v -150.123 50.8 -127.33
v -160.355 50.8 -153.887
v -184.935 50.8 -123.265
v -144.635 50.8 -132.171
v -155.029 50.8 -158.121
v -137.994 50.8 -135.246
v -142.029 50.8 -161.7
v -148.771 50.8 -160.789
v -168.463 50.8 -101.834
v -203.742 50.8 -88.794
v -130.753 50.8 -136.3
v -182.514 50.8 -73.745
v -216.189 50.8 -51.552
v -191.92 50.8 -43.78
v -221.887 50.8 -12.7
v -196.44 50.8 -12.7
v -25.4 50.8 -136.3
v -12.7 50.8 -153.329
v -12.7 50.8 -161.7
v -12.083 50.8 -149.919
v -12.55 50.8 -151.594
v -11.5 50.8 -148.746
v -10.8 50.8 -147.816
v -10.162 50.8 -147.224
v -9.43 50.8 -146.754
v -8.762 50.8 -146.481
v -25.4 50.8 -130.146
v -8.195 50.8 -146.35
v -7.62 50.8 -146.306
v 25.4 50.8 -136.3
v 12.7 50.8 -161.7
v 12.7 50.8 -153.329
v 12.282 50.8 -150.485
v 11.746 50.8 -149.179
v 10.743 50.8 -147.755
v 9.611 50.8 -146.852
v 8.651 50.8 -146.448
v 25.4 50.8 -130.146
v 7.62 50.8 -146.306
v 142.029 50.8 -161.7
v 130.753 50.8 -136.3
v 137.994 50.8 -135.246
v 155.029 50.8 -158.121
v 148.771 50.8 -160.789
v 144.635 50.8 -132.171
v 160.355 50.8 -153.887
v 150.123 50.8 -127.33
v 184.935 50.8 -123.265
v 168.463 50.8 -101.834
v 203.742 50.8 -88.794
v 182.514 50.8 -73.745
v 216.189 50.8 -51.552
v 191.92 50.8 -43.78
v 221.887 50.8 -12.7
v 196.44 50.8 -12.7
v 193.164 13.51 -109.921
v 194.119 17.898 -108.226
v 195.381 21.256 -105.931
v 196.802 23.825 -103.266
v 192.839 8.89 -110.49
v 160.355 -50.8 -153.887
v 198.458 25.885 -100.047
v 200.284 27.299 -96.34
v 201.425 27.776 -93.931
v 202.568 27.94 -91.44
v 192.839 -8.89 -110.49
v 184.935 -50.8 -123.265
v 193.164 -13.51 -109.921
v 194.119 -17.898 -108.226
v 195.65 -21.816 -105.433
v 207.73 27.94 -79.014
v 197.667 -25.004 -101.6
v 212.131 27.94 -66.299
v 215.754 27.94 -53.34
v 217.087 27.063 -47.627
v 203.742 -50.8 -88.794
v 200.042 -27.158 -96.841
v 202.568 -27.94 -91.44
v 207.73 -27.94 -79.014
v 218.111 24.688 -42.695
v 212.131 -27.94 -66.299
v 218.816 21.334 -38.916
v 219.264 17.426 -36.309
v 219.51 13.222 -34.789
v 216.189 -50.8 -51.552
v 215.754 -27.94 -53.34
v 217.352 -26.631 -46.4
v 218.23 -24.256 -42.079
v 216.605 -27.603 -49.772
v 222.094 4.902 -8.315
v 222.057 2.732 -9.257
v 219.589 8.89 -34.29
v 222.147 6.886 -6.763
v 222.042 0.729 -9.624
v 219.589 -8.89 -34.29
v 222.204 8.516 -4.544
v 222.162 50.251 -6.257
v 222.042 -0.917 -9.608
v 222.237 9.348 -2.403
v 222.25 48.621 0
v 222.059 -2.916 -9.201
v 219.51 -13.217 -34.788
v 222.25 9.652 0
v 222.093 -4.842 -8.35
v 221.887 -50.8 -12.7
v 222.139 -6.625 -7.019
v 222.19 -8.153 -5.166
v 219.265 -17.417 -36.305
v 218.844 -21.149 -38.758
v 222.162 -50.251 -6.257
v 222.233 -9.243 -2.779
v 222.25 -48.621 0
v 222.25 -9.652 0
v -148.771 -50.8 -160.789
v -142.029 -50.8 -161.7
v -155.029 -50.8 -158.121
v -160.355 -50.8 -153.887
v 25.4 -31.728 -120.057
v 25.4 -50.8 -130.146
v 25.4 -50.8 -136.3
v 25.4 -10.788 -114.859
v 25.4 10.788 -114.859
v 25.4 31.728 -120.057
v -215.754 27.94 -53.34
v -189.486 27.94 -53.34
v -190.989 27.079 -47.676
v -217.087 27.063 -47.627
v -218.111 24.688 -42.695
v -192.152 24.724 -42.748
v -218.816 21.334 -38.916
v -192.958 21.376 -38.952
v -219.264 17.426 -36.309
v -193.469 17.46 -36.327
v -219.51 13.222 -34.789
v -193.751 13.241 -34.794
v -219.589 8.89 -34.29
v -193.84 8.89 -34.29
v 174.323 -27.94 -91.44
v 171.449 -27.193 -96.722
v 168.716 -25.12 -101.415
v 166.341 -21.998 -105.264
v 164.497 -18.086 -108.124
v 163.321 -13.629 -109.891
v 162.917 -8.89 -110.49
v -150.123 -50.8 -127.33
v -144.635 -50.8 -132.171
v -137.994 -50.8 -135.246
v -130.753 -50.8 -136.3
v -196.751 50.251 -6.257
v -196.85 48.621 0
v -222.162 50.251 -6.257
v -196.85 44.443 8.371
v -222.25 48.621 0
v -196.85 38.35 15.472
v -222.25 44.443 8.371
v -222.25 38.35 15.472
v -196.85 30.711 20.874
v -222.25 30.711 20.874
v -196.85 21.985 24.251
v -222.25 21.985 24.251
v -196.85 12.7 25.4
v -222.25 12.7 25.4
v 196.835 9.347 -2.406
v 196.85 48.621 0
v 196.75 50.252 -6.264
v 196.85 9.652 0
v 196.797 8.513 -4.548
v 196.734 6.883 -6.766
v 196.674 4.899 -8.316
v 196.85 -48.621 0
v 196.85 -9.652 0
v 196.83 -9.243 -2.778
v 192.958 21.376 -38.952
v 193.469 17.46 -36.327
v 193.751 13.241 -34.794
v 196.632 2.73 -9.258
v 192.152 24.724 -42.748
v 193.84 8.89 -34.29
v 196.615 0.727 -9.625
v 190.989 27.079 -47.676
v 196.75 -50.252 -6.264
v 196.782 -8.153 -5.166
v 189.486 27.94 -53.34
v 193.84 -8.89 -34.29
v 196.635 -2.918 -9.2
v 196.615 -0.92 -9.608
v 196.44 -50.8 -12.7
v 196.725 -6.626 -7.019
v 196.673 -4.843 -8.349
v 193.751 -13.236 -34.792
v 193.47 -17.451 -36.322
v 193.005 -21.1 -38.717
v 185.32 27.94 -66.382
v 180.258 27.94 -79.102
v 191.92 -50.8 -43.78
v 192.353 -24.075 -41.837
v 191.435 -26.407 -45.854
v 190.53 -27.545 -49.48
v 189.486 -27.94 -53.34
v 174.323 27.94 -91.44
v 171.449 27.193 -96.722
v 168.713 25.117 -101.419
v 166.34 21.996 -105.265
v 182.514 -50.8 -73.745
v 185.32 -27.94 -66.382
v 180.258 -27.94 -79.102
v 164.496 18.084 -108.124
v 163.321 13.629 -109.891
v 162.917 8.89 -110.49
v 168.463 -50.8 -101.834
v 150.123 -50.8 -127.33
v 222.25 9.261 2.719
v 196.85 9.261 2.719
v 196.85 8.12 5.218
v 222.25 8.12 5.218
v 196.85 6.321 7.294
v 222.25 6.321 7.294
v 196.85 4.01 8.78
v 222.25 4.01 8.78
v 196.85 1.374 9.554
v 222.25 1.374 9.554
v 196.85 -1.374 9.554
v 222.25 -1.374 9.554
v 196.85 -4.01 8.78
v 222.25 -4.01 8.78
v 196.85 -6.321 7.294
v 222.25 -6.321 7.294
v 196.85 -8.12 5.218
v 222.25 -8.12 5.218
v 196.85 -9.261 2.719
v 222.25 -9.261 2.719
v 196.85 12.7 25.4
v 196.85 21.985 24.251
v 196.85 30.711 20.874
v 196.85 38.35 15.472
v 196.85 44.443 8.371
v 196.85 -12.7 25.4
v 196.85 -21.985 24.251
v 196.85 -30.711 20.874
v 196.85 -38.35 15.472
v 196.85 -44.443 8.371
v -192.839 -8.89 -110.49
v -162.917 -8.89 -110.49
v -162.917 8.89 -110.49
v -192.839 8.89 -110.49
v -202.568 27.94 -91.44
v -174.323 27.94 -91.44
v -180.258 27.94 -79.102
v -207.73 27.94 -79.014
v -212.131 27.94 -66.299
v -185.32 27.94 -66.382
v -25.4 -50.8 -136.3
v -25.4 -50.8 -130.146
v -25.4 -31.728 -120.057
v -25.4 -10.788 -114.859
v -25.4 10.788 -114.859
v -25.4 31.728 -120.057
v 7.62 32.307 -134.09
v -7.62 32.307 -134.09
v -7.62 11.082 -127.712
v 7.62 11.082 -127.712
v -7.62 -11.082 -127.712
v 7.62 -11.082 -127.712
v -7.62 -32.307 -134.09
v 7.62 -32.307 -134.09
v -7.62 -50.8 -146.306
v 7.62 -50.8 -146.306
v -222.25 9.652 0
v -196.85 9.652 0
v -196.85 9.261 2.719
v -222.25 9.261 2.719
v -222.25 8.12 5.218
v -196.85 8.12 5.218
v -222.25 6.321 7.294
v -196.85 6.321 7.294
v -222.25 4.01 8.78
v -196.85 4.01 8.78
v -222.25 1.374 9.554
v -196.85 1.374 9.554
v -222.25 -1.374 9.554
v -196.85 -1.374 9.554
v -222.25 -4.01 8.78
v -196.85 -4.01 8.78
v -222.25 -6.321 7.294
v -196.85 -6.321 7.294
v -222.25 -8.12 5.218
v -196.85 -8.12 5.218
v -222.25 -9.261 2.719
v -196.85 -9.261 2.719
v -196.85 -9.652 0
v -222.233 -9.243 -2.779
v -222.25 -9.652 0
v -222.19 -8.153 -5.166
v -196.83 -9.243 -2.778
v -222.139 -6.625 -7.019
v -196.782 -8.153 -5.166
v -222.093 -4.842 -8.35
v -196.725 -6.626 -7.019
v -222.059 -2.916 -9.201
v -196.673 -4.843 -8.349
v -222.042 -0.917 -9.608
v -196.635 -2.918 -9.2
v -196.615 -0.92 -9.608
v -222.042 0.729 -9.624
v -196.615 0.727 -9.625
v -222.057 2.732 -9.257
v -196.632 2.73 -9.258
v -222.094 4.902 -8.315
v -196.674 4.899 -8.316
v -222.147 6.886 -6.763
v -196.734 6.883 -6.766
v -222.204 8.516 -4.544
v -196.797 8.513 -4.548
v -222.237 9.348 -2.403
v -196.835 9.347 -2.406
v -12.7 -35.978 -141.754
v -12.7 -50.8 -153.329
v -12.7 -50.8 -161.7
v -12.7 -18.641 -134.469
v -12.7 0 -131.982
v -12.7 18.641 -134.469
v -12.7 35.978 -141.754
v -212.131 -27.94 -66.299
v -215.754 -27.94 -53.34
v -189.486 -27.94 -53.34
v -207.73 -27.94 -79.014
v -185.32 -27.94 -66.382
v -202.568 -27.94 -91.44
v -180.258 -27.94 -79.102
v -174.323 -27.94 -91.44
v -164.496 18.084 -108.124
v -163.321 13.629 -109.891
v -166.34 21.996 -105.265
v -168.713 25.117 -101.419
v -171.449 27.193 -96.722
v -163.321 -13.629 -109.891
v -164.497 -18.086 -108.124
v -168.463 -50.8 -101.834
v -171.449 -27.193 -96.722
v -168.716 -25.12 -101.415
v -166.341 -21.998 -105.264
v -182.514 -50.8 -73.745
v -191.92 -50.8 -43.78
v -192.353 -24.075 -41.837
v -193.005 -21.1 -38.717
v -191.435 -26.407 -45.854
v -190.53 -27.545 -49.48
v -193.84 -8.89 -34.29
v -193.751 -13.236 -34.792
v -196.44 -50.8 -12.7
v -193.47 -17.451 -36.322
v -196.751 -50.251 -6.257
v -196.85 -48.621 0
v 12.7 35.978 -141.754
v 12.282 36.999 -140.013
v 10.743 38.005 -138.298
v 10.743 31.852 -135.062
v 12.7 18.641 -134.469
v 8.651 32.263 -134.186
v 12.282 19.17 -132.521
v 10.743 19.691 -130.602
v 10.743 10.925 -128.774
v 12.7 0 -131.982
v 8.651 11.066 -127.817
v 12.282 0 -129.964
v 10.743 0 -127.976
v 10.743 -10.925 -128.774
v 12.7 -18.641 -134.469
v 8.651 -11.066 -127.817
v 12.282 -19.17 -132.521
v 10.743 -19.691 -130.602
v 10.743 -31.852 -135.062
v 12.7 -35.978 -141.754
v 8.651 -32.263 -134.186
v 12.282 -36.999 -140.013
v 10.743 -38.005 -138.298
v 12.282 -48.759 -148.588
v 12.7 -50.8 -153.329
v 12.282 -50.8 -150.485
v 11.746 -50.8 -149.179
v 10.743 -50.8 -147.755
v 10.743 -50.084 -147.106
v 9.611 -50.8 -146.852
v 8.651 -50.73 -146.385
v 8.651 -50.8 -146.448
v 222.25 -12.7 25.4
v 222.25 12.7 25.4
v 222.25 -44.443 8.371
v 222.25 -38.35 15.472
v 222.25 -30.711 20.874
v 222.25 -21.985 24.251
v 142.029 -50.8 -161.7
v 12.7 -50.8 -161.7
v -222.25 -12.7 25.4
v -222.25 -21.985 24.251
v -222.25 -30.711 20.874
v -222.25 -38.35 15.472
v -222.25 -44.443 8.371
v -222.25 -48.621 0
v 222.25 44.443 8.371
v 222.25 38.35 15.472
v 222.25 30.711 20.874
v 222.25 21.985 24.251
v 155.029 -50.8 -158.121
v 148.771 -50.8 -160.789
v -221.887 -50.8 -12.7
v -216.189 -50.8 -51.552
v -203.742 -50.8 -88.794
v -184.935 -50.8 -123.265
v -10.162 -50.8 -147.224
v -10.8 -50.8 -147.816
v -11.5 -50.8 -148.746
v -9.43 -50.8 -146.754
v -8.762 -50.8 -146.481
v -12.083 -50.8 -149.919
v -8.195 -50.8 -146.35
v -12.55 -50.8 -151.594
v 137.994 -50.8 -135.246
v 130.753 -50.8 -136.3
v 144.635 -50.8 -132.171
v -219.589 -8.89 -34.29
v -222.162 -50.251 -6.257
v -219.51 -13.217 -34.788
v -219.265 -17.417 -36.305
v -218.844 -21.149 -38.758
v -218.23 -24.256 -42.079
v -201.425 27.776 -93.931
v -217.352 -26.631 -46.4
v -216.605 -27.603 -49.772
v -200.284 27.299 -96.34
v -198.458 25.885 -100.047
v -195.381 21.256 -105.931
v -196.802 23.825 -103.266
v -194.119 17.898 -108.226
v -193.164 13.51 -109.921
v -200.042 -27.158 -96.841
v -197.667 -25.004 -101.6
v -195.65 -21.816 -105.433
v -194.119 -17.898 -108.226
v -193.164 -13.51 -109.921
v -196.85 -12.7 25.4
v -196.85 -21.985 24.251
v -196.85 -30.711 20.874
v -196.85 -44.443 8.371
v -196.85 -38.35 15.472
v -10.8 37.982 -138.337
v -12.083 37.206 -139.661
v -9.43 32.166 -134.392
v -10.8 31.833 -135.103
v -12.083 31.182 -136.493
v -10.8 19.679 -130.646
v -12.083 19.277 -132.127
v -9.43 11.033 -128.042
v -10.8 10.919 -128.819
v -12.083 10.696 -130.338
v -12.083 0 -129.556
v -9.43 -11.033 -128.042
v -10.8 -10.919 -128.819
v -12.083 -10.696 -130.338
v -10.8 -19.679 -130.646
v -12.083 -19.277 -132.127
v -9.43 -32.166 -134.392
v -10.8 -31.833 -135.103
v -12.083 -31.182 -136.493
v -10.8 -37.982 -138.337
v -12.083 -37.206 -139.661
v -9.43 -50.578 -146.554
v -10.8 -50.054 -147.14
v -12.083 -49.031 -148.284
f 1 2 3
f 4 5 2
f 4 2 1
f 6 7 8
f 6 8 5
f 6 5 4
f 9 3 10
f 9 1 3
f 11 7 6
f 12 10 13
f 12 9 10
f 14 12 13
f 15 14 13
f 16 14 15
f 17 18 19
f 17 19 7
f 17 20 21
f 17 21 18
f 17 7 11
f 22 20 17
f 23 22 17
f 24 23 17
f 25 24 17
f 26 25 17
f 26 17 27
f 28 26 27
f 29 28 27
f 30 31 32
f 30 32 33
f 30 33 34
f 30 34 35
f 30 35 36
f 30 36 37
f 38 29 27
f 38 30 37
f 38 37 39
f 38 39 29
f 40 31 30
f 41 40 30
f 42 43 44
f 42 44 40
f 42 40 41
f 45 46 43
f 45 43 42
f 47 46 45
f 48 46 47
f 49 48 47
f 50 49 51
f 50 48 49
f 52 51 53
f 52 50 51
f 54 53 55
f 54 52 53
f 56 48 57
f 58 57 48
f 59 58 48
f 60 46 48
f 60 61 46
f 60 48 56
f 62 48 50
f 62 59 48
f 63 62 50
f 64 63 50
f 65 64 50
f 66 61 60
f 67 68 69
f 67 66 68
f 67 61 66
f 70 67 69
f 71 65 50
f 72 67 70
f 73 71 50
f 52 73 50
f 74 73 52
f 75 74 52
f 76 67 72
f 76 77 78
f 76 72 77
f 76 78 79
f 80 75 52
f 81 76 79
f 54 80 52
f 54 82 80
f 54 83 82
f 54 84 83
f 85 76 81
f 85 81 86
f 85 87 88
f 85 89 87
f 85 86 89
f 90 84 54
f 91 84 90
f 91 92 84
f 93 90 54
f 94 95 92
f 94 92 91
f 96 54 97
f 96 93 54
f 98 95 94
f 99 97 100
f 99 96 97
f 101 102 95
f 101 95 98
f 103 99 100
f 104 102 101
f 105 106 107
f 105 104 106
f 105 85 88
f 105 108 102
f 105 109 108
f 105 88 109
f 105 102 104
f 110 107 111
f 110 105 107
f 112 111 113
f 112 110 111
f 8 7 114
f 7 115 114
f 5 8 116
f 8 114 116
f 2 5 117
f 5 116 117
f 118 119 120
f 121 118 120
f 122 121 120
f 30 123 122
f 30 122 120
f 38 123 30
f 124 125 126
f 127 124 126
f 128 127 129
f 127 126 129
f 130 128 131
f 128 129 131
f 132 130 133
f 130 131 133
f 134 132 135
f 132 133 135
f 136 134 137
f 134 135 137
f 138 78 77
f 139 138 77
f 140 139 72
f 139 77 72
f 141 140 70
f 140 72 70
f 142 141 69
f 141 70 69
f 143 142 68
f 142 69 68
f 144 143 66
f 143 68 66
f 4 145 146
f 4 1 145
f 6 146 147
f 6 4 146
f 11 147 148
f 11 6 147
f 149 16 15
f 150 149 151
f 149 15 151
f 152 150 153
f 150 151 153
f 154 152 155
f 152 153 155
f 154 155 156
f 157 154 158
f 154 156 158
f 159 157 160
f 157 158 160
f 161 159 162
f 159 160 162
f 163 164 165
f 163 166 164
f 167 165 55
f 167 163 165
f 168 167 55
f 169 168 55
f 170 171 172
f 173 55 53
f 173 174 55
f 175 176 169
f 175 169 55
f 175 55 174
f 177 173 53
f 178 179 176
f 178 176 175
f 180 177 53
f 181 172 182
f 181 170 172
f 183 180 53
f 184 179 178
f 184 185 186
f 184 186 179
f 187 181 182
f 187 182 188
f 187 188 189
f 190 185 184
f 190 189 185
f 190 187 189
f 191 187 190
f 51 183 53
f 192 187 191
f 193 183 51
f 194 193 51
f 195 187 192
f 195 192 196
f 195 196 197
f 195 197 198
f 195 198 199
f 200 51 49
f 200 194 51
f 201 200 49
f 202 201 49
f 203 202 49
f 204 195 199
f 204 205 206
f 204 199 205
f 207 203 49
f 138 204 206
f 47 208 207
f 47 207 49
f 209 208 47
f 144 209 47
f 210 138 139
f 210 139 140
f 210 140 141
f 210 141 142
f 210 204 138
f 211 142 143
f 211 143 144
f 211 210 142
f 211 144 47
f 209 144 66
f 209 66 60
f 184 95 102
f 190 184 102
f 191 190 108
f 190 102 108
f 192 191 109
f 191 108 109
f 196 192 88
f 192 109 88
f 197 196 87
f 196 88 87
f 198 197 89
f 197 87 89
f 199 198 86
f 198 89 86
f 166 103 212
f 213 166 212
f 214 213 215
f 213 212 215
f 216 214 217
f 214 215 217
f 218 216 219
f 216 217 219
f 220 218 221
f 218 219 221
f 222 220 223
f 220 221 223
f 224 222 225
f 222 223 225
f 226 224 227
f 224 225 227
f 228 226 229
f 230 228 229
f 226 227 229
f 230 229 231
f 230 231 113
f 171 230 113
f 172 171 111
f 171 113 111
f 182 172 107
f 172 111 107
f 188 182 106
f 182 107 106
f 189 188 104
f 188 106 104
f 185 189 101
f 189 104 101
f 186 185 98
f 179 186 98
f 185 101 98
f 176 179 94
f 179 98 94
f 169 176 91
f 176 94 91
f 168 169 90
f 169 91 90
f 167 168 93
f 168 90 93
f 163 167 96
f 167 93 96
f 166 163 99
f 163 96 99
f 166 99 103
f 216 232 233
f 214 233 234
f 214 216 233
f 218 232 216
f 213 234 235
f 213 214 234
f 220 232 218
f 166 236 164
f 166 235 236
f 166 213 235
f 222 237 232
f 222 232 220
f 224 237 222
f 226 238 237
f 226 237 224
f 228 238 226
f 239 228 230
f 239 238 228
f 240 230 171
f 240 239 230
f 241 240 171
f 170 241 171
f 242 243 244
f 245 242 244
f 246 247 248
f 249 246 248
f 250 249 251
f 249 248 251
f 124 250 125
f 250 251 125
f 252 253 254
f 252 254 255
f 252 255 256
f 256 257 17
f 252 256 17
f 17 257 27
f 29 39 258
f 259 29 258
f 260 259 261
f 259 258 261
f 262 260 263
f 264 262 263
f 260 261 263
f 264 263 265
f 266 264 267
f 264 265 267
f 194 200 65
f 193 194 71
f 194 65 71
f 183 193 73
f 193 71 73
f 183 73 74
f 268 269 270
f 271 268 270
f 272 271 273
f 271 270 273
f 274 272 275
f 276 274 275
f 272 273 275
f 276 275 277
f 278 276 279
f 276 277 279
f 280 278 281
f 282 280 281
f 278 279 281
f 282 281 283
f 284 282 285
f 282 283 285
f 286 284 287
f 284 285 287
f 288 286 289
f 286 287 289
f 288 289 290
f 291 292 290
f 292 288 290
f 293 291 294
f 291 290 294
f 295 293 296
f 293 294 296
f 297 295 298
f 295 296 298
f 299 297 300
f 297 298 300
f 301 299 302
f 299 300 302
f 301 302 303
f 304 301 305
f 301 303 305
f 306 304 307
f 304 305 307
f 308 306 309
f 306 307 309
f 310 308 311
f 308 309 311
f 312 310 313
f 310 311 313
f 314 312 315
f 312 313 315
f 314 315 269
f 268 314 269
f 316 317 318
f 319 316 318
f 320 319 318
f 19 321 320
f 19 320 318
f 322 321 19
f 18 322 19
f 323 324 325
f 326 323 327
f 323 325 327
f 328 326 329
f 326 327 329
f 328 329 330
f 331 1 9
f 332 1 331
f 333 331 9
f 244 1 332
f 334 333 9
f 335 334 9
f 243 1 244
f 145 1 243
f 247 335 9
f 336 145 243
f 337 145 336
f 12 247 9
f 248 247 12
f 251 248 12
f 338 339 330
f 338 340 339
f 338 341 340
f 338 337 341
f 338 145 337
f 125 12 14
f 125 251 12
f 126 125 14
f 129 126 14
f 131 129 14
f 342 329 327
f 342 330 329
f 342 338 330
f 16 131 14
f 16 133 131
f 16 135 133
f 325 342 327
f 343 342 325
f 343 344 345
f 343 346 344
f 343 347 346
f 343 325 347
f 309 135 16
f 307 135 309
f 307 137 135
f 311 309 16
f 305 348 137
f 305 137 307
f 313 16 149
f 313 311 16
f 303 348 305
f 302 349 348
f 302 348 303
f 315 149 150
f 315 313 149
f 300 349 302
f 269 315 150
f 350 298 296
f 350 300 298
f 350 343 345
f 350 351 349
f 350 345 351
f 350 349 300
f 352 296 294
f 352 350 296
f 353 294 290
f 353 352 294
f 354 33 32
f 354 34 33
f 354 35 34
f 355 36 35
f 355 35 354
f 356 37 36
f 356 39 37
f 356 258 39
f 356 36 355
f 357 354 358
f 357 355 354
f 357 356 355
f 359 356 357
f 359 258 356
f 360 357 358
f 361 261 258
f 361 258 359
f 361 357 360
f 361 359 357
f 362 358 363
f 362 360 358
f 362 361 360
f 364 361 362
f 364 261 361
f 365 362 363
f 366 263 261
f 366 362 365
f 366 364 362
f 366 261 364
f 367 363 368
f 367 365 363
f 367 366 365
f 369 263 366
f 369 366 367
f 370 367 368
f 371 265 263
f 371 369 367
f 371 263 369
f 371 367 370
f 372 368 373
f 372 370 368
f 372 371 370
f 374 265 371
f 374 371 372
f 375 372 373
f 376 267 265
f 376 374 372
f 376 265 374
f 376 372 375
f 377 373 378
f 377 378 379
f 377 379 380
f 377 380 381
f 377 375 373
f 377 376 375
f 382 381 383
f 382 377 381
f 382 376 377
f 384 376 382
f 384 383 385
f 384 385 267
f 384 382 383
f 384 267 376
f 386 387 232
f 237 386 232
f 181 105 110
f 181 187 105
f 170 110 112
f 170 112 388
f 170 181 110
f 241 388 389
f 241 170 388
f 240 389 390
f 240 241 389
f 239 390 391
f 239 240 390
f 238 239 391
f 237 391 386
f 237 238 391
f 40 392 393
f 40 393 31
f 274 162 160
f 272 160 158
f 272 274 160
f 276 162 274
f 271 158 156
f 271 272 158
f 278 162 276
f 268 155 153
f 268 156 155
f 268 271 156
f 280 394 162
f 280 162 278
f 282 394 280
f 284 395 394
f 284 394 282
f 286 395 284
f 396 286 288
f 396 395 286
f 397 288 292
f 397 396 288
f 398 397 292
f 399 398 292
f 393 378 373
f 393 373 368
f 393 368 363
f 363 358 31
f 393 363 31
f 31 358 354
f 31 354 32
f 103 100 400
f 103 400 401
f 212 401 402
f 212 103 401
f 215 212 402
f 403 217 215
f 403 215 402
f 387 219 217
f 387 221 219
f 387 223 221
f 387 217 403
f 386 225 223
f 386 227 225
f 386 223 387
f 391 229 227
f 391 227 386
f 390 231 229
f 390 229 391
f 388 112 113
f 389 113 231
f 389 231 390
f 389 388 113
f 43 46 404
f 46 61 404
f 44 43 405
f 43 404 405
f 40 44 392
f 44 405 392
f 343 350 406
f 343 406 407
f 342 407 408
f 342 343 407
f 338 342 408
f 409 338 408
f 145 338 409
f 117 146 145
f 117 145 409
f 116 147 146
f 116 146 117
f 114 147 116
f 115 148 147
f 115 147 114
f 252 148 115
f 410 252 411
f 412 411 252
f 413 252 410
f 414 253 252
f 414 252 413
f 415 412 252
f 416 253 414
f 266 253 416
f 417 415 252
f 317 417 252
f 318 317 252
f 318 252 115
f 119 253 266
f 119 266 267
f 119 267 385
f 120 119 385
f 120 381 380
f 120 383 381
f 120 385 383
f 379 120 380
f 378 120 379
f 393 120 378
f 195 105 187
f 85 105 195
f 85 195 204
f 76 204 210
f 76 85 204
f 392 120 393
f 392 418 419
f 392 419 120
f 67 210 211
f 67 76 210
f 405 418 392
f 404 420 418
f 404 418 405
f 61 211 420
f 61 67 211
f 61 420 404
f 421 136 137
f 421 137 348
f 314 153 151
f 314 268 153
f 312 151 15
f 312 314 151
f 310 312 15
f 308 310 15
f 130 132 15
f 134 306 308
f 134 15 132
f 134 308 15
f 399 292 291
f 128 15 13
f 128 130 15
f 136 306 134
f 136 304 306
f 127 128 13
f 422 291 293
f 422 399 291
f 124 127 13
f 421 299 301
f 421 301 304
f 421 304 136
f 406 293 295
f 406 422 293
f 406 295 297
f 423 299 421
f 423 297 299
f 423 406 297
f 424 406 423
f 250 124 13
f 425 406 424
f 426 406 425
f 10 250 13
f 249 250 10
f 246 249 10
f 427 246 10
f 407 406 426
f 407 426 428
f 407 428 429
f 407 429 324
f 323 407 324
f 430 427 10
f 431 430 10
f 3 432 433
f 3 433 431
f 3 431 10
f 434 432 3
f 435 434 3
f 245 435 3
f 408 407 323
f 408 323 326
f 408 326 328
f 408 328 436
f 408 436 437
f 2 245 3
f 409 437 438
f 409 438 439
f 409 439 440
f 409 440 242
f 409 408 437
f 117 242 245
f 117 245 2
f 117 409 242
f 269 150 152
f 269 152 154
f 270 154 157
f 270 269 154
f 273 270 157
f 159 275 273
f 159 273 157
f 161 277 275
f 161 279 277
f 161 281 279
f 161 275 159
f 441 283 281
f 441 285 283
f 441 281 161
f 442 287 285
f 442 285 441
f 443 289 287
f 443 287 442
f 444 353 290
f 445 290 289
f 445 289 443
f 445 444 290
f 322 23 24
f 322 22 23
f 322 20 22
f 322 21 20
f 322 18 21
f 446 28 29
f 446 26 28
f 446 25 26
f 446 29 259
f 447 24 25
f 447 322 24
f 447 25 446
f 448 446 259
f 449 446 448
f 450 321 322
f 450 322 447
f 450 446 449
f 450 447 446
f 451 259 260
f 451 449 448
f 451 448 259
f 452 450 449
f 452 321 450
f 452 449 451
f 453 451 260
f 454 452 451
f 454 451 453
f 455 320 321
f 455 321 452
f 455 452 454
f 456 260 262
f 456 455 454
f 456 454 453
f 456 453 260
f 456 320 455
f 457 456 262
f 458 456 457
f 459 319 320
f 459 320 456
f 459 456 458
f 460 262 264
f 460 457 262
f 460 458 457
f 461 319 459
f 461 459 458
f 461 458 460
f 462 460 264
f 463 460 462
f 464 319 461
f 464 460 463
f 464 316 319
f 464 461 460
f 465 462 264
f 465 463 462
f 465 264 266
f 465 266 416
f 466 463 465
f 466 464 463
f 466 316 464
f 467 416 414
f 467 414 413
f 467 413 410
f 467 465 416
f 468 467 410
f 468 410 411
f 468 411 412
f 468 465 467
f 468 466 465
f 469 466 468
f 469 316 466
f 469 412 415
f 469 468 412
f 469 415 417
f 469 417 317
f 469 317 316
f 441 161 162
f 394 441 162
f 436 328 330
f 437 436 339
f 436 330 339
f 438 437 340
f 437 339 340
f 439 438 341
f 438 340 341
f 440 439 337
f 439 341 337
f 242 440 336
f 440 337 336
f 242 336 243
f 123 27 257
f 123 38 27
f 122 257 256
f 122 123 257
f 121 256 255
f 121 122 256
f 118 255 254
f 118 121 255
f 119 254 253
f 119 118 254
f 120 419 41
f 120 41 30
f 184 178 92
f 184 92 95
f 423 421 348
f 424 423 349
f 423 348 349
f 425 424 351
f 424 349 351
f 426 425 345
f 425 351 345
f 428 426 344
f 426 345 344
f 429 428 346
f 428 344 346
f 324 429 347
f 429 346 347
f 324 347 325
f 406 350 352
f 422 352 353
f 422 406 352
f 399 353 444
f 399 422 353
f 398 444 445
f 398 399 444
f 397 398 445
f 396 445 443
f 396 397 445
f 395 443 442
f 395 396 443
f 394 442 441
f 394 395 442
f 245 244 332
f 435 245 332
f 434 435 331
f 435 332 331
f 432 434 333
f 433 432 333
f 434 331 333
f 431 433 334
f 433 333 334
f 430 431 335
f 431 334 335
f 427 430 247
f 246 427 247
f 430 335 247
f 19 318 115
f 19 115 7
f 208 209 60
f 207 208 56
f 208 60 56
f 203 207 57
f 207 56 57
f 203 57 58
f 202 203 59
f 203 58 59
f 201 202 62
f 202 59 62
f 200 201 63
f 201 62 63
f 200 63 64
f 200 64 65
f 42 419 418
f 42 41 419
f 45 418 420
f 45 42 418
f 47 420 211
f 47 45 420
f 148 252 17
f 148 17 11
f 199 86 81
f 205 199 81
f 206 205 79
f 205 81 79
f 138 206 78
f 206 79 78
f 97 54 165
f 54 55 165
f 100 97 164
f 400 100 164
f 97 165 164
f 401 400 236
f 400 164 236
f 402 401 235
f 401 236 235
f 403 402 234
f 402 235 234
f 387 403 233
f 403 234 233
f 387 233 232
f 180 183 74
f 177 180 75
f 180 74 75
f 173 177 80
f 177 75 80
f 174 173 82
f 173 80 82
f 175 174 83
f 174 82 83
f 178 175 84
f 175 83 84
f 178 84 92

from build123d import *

# Parameters (mm, degrees)
F1_DEPTH  = 50.8
F2_R      = 25.4
F3_R      = 38.1
F4_R      = 9.652
F5_DEPTH  = 241.3
F8_DEPTH  = 25.4
F10_DEPTH = 12.7
F12_DEPTH = 279.4
F13_R     = 5.08


with BuildPart() as f1:
    # F0 (on Front) → F1 (new body, symmetric)
    with BuildSketch(Plane.XZ):
        with BuildLine():
            ThreePointArc((-142.028809, -136.300183), (-182.631177, -73.455944), (-196.85, 0))
            Line((-196.85, 0), (-196.85, 25.4))
            Line((-196.85, 25.4), (-222.25, 25.4))
            Line((-222.25, 25.4), (-222.25, 0))
            ThreePointArc((-222.25, 0), (-204.061581, -88.056423), (-152.47332, -161.700183))
            Line((-152.47332, -161.700183), (-112.262965, -161.700183))
            Line((-112.262965, -161.700183), (112.262965, -161.700183))
            Line((112.262965, -161.700183), (152.47332, -161.700183))
            ThreePointArc((152.47332, -161.700183), (204.061581, -88.056423), (222.25, 0))
            Line((222.25, 0), (222.25, 25.4))
            Line((222.25, 25.4), (196.85, 25.4))
            Line((196.85, 25.4), (196.85, 0))
            ThreePointArc((196.85, 0), (182.631177, -73.455944), (142.028809, -136.300183))
            Line((142.028809, -136.300183), (-142.028809, -136.300183))
        make_face()
    extrude(amount=F1_DEPTH, both=True)

    # F2
    f2_edges = [f1.edges().sort_by_distance(p)[0] for p in [
        (-142.028809, 0, -136.300183),
        (-152.47332, 0, -161.700183),
        (152.47332, 0, -161.700183),
        (142.028809, 0, -136.300183),
    ]]
    fillet(f2_edges, radius=F2_R)

    # F3
    f3_edges = [f1.edges().sort_by_distance(p)[0] for p in [
        (-209.55, -50.8, 25.4),
        (-209.55, 50.8, 25.4),
        (209.55, 50.8, 25.4),
        (209.55, -50.8, 25.4),
    ]]
    fillet(f3_edges, radius=F3_R)

    # F4 (on Right) → F5 (cut, symmetric)
    with BuildSketch(Plane.YZ):
        Circle(F4_R)
    extrude(amount=F5_DEPTH, both=True, mode=Mode.SUBTRACT)

    # F7 (on Right) → F8 (join, symmetric)
    with BuildSketch(Plane.YZ):
        with BuildLine():
            Line((50.8, -153.887304), (50.8, -130.146238))
            ThreePointArc((50.8, -130.146238), (0, -114.202183), (-50.8, -130.146238))
            Line((-50.8, -130.146238), (-50.8, -153.887304))
            Line((-50.8, -153.887304), (-50.8, -161.700183))
            Line((-50.8, -161.700183), (50.8, -161.700183))
            Line((50.8, -161.700183), (50.8, -153.887304))
        make_face()
    extrude(amount=F8_DEPTH, both=True)

    # F9 (on Right) → F10 (cut, symmetric)
    with BuildSketch(Plane.YZ):
        with BuildLine():
            Line((50.8, -161.700183), (63.9712, -161.700183))
            ThreePointArc((63.9712, -161.700183), (0, -126.902183), (-63.9712, -161.700183))
            Line((-63.9712, -161.700183), (-50.8, -161.700183))
            Line((-50.8, -161.700183), (50.8, -161.700183))
        make_face()
    extrude(amount=F10_DEPTH, both=True, mode=Mode.SUBTRACT)

    # F11 (on Right) → F12 (cut, symmetric)
    with BuildSketch(Plane.YZ):
        with BuildLine():
            Line((-8.89, -110.49), (8.89, -110.49))
            ThreePointArc((8.89, -110.49), (22.360384, -104.910384), (27.94, -91.44))
            Line((27.94, -91.44), (27.94, -53.34))
            ThreePointArc((27.94, -53.34), (22.360384, -39.869616), (8.89, -34.29))
            Line((8.89, -34.29), (-8.89, -34.29))
            ThreePointArc((-8.89, -34.29), (-22.360384, -39.869616), (-27.94, -53.34))
            Line((-27.94, -53.34), (-27.94, -91.44))
            ThreePointArc((-27.94, -91.44), (-22.360384, -104.910384), (-8.89, -110.49))
        make_face()
    extrude(amount=F12_DEPTH, both=True, mode=Mode.SUBTRACT)

    # F13
    f13_edges = [f1.edges().sort_by_distance(p)[0] for p in [
        (12.7, 0, -126.902183),
        (-12.7, 0, -126.902183),
    ]]
    fillet(f13_edges, radius=F13_R)


solid = f1.part
